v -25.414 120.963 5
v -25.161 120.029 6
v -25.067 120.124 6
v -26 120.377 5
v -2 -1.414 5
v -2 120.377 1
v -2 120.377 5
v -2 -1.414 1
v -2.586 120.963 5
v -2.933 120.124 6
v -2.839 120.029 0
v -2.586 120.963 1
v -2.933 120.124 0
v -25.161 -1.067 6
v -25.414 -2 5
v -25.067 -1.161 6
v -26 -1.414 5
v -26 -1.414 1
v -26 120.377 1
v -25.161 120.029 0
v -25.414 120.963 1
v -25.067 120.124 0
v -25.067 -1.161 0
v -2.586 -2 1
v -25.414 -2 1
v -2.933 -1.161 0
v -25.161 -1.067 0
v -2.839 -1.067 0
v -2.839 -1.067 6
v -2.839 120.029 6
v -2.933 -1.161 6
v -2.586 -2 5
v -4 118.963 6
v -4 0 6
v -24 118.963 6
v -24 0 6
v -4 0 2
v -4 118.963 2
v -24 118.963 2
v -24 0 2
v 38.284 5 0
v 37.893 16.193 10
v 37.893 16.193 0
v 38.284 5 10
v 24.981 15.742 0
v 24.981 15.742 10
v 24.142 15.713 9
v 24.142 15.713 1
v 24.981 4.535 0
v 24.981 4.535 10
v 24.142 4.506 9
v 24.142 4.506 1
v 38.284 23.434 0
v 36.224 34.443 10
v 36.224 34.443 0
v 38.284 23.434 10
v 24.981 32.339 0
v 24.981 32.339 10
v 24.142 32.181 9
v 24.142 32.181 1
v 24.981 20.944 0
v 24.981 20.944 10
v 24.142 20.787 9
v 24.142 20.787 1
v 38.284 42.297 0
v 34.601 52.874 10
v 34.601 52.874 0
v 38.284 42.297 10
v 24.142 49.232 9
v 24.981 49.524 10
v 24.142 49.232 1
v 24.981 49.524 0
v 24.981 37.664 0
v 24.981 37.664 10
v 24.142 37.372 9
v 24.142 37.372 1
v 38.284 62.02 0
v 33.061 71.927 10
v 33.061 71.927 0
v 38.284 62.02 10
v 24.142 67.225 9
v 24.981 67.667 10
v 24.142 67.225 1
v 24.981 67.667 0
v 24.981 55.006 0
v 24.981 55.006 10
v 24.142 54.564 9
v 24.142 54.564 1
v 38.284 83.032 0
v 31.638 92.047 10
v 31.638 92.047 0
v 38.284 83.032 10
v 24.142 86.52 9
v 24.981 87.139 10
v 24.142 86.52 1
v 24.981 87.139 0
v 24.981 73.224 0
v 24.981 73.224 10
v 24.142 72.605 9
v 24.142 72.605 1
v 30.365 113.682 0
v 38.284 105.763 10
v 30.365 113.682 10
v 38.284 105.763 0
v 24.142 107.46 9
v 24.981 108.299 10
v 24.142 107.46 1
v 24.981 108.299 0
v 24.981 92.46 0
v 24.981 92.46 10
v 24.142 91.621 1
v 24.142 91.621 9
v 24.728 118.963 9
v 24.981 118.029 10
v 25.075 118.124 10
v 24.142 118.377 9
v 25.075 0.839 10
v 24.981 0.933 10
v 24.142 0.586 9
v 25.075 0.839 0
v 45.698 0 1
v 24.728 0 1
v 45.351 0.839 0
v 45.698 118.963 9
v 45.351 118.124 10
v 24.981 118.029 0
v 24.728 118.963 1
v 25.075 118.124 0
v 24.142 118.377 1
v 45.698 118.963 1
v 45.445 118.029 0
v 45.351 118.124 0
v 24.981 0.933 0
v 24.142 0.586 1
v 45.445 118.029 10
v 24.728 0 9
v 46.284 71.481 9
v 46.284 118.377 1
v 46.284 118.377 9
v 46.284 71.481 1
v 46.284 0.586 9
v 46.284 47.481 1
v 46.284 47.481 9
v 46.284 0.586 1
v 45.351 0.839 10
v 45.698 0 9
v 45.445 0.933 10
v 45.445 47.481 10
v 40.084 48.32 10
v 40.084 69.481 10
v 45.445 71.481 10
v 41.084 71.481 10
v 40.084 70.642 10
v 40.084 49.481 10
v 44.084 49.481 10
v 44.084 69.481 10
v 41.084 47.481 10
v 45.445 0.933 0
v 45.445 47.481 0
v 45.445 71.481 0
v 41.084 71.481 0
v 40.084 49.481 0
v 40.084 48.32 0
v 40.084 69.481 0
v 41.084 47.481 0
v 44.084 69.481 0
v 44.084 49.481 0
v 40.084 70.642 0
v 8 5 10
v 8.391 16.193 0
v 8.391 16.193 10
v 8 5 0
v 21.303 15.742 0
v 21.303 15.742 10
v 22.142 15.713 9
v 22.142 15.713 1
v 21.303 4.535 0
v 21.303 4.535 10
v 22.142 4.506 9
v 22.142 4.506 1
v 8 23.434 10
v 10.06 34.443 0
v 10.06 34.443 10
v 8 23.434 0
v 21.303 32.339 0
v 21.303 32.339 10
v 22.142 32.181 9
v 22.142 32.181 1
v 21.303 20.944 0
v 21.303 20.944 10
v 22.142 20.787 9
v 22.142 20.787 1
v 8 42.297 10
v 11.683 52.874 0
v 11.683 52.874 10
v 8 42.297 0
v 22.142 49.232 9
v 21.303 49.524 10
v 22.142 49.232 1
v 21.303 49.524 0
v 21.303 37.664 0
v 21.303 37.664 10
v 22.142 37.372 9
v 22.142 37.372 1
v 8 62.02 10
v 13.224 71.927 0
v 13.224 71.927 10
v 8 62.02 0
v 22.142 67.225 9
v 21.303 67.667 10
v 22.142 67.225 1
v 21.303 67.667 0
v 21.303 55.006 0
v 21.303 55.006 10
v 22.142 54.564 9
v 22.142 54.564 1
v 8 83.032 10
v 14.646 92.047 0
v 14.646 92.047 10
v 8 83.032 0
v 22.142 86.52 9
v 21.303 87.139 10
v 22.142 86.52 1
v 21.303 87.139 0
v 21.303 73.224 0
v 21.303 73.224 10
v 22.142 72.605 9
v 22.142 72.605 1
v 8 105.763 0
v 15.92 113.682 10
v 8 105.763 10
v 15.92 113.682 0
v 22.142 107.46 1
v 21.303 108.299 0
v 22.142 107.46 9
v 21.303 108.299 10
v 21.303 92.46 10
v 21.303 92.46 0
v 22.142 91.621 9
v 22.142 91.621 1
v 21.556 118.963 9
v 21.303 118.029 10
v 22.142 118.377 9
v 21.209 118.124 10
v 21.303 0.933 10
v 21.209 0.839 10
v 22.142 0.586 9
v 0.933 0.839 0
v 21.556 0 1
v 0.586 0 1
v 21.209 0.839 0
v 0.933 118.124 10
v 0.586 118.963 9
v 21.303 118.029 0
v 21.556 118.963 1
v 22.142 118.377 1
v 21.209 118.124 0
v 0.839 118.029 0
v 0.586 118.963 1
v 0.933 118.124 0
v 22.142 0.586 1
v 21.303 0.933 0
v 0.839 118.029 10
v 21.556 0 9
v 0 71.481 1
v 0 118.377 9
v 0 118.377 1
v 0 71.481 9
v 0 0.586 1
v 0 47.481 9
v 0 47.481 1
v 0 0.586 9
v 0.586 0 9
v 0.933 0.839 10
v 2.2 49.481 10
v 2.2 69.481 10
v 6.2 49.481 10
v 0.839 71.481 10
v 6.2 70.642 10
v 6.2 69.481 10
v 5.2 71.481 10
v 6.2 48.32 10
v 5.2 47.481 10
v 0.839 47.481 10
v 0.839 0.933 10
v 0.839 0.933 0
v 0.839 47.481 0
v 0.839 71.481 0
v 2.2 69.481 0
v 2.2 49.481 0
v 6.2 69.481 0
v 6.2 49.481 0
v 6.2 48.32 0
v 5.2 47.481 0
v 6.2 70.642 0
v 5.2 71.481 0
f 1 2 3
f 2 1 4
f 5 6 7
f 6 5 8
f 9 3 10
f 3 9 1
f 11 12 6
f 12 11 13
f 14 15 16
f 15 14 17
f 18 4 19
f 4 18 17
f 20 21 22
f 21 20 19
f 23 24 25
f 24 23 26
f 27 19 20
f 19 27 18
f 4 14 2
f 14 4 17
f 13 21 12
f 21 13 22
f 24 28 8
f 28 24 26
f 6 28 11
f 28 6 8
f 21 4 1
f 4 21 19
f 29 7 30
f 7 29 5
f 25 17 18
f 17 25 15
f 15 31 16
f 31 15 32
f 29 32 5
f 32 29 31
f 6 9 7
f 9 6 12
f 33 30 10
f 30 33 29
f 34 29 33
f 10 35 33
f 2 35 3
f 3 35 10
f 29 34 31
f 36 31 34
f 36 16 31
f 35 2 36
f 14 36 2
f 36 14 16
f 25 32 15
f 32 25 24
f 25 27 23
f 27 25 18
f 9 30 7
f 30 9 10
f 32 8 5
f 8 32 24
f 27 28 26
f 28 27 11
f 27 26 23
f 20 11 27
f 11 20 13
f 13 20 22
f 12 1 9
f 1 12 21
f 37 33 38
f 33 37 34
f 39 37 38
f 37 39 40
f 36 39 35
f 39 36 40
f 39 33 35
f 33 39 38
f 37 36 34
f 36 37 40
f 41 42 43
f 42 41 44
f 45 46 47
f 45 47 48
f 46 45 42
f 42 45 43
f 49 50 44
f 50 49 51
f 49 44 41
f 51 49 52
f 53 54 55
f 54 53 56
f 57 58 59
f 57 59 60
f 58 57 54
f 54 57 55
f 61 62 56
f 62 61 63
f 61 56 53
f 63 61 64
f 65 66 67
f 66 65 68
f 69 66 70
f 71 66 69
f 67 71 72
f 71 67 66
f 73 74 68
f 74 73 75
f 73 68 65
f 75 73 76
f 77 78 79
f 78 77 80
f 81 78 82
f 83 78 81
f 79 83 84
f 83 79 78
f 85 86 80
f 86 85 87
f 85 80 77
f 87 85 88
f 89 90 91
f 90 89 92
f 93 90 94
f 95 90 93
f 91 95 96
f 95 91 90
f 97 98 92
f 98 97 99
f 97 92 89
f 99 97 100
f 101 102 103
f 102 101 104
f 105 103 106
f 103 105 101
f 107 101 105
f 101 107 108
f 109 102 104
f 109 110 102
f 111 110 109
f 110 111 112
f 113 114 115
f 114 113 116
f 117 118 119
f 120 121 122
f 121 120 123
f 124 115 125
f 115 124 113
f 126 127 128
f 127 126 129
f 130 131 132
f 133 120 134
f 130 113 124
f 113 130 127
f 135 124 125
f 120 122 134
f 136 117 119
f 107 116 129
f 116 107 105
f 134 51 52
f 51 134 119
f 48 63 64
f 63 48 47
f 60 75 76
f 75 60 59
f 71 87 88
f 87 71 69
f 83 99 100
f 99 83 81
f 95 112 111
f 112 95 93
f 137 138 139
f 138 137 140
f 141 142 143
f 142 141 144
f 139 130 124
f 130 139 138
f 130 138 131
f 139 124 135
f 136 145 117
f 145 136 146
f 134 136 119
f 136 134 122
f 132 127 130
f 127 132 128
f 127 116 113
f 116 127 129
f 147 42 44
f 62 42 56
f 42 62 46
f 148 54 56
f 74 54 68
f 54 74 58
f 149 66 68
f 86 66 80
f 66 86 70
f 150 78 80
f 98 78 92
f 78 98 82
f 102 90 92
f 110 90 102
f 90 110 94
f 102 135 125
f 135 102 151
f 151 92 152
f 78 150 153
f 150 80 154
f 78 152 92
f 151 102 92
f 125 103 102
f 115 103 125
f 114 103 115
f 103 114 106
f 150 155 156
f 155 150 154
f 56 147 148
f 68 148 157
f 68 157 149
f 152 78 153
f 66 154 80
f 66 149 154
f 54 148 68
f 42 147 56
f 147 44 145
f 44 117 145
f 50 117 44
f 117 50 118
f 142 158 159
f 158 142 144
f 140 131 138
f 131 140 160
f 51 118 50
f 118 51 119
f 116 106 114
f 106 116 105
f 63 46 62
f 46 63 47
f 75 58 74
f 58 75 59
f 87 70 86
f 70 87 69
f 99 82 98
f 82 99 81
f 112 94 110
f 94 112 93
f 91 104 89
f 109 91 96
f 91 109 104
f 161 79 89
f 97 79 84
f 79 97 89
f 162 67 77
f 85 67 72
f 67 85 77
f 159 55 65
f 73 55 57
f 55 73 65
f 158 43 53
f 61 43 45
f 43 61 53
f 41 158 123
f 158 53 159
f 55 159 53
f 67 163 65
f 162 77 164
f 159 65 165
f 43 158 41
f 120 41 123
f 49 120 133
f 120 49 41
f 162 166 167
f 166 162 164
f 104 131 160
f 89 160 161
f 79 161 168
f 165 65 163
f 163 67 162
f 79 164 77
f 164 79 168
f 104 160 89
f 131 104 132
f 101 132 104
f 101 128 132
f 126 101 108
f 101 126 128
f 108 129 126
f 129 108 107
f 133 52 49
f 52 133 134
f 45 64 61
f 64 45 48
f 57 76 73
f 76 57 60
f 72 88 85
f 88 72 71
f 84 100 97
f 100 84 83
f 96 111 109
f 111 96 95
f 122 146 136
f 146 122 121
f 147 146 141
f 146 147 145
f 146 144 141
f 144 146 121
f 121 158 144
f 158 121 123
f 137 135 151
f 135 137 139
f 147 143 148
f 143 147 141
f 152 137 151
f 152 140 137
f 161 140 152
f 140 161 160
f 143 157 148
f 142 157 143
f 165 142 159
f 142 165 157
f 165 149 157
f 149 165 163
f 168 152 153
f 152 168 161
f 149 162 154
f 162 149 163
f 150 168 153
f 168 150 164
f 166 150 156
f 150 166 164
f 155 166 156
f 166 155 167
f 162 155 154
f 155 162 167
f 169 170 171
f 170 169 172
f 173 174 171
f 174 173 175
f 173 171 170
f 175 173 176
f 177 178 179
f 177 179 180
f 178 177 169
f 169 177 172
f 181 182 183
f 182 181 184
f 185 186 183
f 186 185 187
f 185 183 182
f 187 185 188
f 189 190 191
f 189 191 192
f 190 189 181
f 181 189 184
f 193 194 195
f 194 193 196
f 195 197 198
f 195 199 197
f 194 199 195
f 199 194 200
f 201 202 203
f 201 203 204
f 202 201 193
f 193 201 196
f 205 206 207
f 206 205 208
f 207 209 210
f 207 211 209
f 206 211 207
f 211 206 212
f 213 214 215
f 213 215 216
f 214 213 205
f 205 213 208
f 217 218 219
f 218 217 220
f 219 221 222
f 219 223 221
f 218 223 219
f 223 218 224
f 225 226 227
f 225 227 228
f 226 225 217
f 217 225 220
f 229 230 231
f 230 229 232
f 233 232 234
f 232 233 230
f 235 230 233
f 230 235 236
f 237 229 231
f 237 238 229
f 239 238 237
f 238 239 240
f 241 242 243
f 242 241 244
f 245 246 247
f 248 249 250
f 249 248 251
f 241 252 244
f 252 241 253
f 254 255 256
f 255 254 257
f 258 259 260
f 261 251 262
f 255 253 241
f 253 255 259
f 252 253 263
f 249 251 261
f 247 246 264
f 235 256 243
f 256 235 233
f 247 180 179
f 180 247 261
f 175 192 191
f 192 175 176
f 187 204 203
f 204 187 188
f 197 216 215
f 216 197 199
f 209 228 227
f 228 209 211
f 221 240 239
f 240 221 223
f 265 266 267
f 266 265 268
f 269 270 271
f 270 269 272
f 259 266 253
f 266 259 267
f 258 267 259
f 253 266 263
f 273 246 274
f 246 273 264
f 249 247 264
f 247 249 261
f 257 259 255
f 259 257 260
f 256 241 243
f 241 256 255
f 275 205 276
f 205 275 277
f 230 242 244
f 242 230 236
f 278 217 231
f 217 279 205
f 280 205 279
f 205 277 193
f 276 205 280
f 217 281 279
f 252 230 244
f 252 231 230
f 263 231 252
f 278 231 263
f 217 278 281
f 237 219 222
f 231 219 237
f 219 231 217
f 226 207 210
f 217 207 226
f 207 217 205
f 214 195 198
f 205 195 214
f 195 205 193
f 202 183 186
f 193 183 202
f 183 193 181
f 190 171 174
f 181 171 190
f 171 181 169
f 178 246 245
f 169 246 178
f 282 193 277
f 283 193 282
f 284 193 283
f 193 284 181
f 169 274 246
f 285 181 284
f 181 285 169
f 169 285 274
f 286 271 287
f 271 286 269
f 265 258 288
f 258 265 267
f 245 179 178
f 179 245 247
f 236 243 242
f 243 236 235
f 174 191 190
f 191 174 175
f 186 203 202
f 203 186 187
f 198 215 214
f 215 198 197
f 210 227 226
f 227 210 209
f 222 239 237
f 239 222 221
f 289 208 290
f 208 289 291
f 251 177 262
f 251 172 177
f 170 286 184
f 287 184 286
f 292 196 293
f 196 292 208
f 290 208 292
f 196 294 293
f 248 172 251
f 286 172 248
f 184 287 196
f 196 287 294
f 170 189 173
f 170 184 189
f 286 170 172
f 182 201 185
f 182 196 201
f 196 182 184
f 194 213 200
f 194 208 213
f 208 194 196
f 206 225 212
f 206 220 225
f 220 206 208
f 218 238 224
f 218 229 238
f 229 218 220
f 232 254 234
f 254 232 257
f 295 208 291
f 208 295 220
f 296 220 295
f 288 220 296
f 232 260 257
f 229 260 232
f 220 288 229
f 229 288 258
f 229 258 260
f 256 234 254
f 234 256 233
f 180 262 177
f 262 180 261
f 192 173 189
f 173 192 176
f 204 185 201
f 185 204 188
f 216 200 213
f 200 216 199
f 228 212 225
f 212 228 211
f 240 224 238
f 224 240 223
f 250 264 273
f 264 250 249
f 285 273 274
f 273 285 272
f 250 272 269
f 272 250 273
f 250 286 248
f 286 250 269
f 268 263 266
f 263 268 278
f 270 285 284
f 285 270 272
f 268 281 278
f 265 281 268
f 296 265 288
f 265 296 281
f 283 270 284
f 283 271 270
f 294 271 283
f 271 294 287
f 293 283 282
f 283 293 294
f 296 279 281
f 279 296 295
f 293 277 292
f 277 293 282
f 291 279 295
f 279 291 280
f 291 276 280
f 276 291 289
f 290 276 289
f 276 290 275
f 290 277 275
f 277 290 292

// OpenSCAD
// [FL_INDEX: keywords="openscad, 3d_parametric, Customizable_Multi_Stand, csg_solid" | COT="Parametric OpenSCAD design from 3DCodeverse"]
// Title: Customizable Multi Stand

// Title: MultiStand
// Author: http://www.thingiverse.com/Jinja
// Date: 29/1/2013

/////////// START OF PARAMETERS /////////////////

// The thickness of your tablet. This will determine the size of the slots your tablet will fit into. mm =
tablet_thickness = 11.2;

// The height of your tablet. If you only want landscape, then use the short length. Otherwise use the long length. mm =
tablet_height = 190;

// How deep each slot will be, just under 10% of your tablet height is a good guide. mm =
slot_depth = 10.0;

// Increase the length of your stand to get more slots, % =
extra_length_percent=0; //[0:100]

// How many lids do you want for your stand. 
number_of_lids = 1; // [1:OneLid, 2:TwoLids]

// How wide in mm each rest will be. mm =
stand_width = 10; //[6:20]

// To discover the calibration value of your printer, first print out the lid. Then print out the calibration rest which will fit onto the lid. If the fit is too loose then increase the calibration and try again. If the fit is too tight then decrease the calibration value. I suggest printing out CalibrationRests for values 0, 2 & 4 simultaneously and go from there. When you've found your value then you can print out the full sized Rest. Zero means your printer is perfectly calibrated. Value = 
calibration = 0;//[-8:8]

// Select which STL plate you want to create. 
plate = "FullPlate"; //[ Lid, CalibrationRest, Rest, FullPlate ]

// Choose the pattern for the lid. For speed, use the circle to iterate on positioning before choosing the pattern you want. This is because the circle is faster to process. In fact, the list is ordered from fast to slow.
patternID = 0; // [0:NoPattern, 1:Circle, 4:Fish, 3:Apple, 5:Makerbot, 2:Android]

// Offset the pattern in the X axis. mm =
pattern_offset_x = 0; //[-20:20]

// Offset the pattern in the Y axis. mm =
pattern_offset_y = 0; //[-20:20]

// The size of the pattern. mm =
pattern_size = 35; //[8:60]

// Spacing percentage. 100=no overlap. Less than 100 means some overlap. More than 100 means more space between the patterns. % =
pattern_overlap_percent = 105; //[50:150]

// preview[view:south, tilt:top]

/////////// END OF PARAMETERS /////////////////
// not parameters, do not change
pattern_overlap = pattern_overlap_percent/100;
overhang = 40*1;  // the angle of overhang your printer can manage (no need to exceed 45)
rounded = 1*1;    // the mm width of the bevelled edge
rear_buf = 5*1;
front_buf = 2+tablet_thickness;

holder_height = 6*1;
holder_thick = 2*1;

extra_length=1+ (extra_length_percent/100);
base_min = holder_height+2;
height = base_min+slot_depth/sin(45);
slot_range = tablet_height*sin(45)*0.75*extra_length;
depth = rear_buf+slot_range + front_buf;
spacing = (1.1*tablet_thickness)/sin(45);
num_slots = floor(slot_range/spacing);
buffer = (calibration)*0.05;

calib_width = 2*(stand_width+holder_thick)+4;

if( plate == "Calibration" )
{
	test_stand();
	translate([-7,12,0])
	holder(3, 20, 0, 0);
}
else if( plate == "CalibrationRest" )
{
//		translate([0,-depth*0.5+5+holder_thick+2,0])
//		final_stand(number_of_lids);
	difference()
	{
	intersection()
	{
		translate([0,-depth*0.5+stand_width+holder_thick+2,0])
		final_stand(1);
		cube([holder_height+2,calib_width,5]);
	}

	for(i=[-8:1:8])
	{
		translate([holder_height+2,(0.5+(i/16))*calib_width,5*0.5])
		cube([calib_width/32,calib_width/32,calib_width/32],true);
	}
	for(i=[-8:8:8])
	{
		translate([holder_height+2,(0.5+(i/16))*calib_width,5*0.3])
		cube([calib_width/32,calib_width/32,calib_width/32],true);
	}
	translate([holder_height+2,(0.5+(calibration/16))*calib_width,5*0.7])
	cube([calib_width/32,calib_width/32,calib_width/32],true);
	}
}
else if( number_of_lids == 1 )
{
   if( plate == "FullPlate" )
	{
		translate([-(stand_width+holder_thick)-2,depth*0.5,0])
		holder(stand_width, depth, 0, patternID);
	
		translate([2*height+2,0,0])
		scale([-1,1,1])
		final_stand(number_of_lids);
	
		translate([0,0,0])
		final_stand(number_of_lids);
	}
	else if ( plate == "Lid" )
	{
		translate([-(stand_width+holder_thick)-2,depth*0.5,0])
		holder(stand_width, depth, 0, patternID);
	}
	else if ( plate == "Rest" )
	{
		final_stand(number_of_lids);
	}
}
else if ( number_of_lids == 2 )
{
   if( plate == "FullPlate" )
	{
		translate([3*-(stand_width+holder_thick)-4,depth*0.5,0])
		holder(stand_width, depth, 0, patternID);
	
		translate([-(stand_width+holder_thick)-2,depth*0.5,0])
		holder(stand_width, depth, 0, patternID);
	
		translate([2*height+2,0,0])
		scale([-1,1,1])
		final_stand(number_of_lids);
	
		translate([0,0,0])
		final_stand(number_of_lids);
	}
	else if ( plate == "Lid" )
	{
		translate([-(stand_width+holder_thick)-2,depth*0.5,0])
		holder(stand_width, depth, 0, patternID);
	}
	else if ( plate == "Rest" )
	{
		final_stand(number_of_lids);
	}

}


$fs=0.3;
//$fa=5; //smooth
$fa=10; //not so smooth
//$fa=20; //rough

module lid_cutter(pos, patternID )
{
	translate([0.2,depth*0.5,0])
	rotate([90,0,90])
	holder(stand_width, depth, buffer, patternID);

	translate([-1,depth*0.5,0])
	rotate([90,0,90])
	holder(stand_width, depth, buffer, patternID);
}

module test_stand()
{
	step = 13;
	difference()
	{
		minkowski()
		{
			translate([rounded, rounded, rounded])
			cube([11, 8*step+2, 1]);
			diamond(rounded);
		}
	for(i=[0:1:7])
	{
		translate([0,i*step+8,0])
		rotate( [90,0,90] )
   	holder( 3, 20, 0.0+(i*0.05) );
		translate([-1,i*step+8,0])
		rotate( [90,0,90] )
   	holder( 3, 20, 0.0+(i*0.05) );
		
		translate([7,i*step+4,1])
		{
			if(i==0)
			{
				write("1",h=8,t=4);
			}
			else if(i==1)
			{
				write("2",h=8,t=4);
			}
			else if(i==2)
			{
				write("3",h=8,t=4);
			}
			else if(i==3)
			{
				write("4",h=8,t=4);
			}
			else if(i==4)
			{
				write("5",h=8,t=4);
			}
			else if(i==5)
			{
				write("6",h=8,t=4);
			}
			else if(i==6)
			{
				write("7",h=8,t=4);
			}
			else if(i==7)
			{
				write("8",h=8,t=4);
			}
		}

	}
	}
}

module final_stand(number_of_lids)
{
	pos = -stand_width*2;
	if( number_of_lids == 1 )
	{
		difference()
		{
			stand2();
			lid_cutter(pos,0);
		}
	}
	else if (number_of_lids == 2 )
	{
		difference()
		{
			stand2();
			translate([0,depth*0.25,0])	
			lid_cutter(pos,0);
			translate([0,depth*-0.25,0])	
			lid_cutter(pos,0);
		}
	}
}

module right_stand(number_of_lids)
{
//	pos = -stand_width;
	pos = -stand_width*2;
	if( number_of_lids == 1 )
	{
		difference()
		{
			stand();
			lid_cutter(pos,0);
		}
	}
	else if (number_of_lids == 2 )
	{
		difference()
		{
			stand();
			translate([0,depth*0.25,0])	
			lid_cutter(pos,0);
			translate([0,depth*-0.25,0])	
			lid_cutter(pos,0);
		}
	}

}

module left_stand(number_of_lids)
{
//	pos = -depth-2*holder_thick;
	pos = -stand_width*2;
	if( number_of_lids == 1 )
	{
		difference()
		{
			stand();
			lid_cutter(pos,0);
		}
	}
	else if (number_of_lids == 2 )
	{
		difference()
		{
			stand();

			translate([0,depth*0.25,0])	
			lid_cutter(pos,0);
			translate([0,depth*-0.25,0])	
			lid_cutter(pos,0);
		}
	}
}

module holder(stand_width, depth, outerextra, patternID)
{
	difference()
	{
		minkowski()
		{
			translate([0, 0, (holder_height+outerextra)*0.5])
			cube([(stand_width+holder_thick+outerextra)*2-(2*rounded), depth+2*(outerextra+holder_thick)-(2*rounded), holder_height+outerextra-(2*rounded)],true);
			diamond(rounded);
		}
		translate([0, 0, holder_thick+holder_height*0.5 + outerextra])
		cube([(stand_width-outerextra)*2, depth-2*outerextra, holder_height+outerextra],true);

		if( patternID > 0 )
		{
			pattern(stand_width, depth, outerextra, patternID );
		}
	}
}

module pattern(stand_width, depth, extra, patternID)
{
	xoffset = pattern_offset_x;
	yoffset = pattern_offset_y;
	steps = pattern_size;
	radius = steps*0.45;
	overlap = pattern_overlap;
	intersection()
	{
		for(x=[xoffset-10:steps*overlap:(stand_width+holder_thick+extra)*2-(2*rounded)+(steps)+xoffset+10])
		{
			for(y=[yoffset-10:steps*overlap:depth+2*(extra+holder_thick)-(2*rounded)+(steps)+yoffset+10])
			{
				translate([-stand_width*2, -0.5*(depth+2*(extra+holder_thick)-(2*rounded)), 0])
				translate([x,y,-1])
				rotate([0,0,x*57+y*79])
				pattern_shape( radius, 10, patternID );
//				android( radius*2, 10 );
//				cylinder(10, radius, radius);
			}
		}
		translate([0, 0, (holder_height+extra)*0.5])
		cube([(stand_width+extra)*2, depth+2*extra, holder_height*3],true);
	}
}

module stand2()
{
	final_spacing = slot_range/(num_slots);
	between = (final_spacing - tablet_thickness);
	adj_spacing = final_spacing - (between/num_slots);
	difference()
	{
		minkowski()
		{
			translate([rounded-buffer, rounded-buffer, rounded])
			cube([height-(2*rounded), depth-(2*rounded)-(2*buffer)-(2*buffer), stand_width-(2*rounded)-(2*buffer)]);
			diamond(rounded);
		}
		if( num_slots > 7 )
		{

			for(i=[0:1:(num_slots)])
			{
				
				translate([base_min,(i*adj_spacing)+rear_buf+(((i/num_slots)*(i/num_slots)*(i/num_slots)*(i/num_slots)*(i/num_slots)*(i/num_slots))*between),-0.1])
				rotate([0,0,-(0+i*(45/(num_slots)))])
				cube([height*2, tablet_thickness, stand_width-2*buffer+0.2]);
			}
		}
		else if( num_slots > 5 )
		{
			for(i=[0:1:(num_slots)])
			{
				
				translate([base_min,(i*adj_spacing)+rear_buf+(((i/num_slots)*(i/num_slots)*(i/num_slots)*(i/num_slots)*(i/num_slots))*between),-0.1])
				rotate([0,0,-(0+i*(45/(num_slots)))])
				cube([height*2, tablet_thickness, stand_width-2*buffer+0.2]);
			}
		}
		else
		{
			for(i=[0:1:(num_slots)])
			{
				
				translate([base_min,(i*adj_spacing)+rear_buf+(((i/num_slots)*(i/num_slots)*(i/num_slots))*between),-0.1])
				rotate([0,0,-(2+i*(43/(num_slots)))])
				cube([height*2, tablet_thickness, stand_width-2*buffer+0.2]);
			}
		}
	}
}

module cutter(dist, overhang)
{
	size = dist*2;

	translate([dist,-dist,-dist])
	cube([size,size,size]);

	translate([-dist-size,-dist,-dist])
	cube([size,size,size]);

	translate([dist,-dist,0])
	rotate([0,-overhang,0])
	cube([size,size,size]);

	translate([-dist,-dist,0])
	rotate([0,-90+overhang,0])
	cube([size,size,size]);

	translate([dist,-dist,0])
	rotate([0,90+overhang,0])
	cube([size,size,size]);

	translate([-dist,-dist,0])
	rotate([0,180-overhang,0])
	cube([size,size,size]);

}

module diamond( rounded )
{
	dist = rounded;
	difference()
	{
		cube([2*rounded,2*rounded,2*rounded], true);
		for(i=[0:45:179])
		{
			rotate([0,0,i])
			cutter(dist, overhang);
		}
	}
}

//translate([0,0,30])
//android( 20, 4 );

module android( oheight, depth )
{
	scale = 1.1;
	height = oheight*scale;
	width = height*0.4;
	gap = height*0.03;
	radius = height*0.045;

//	cube( [ oheight,2,oheight] );

	translate( [-oheight*0.5,oheight*0.5,0])
	rotate([90,0,0])
	translate( [-(height-oheight)*0.5,-depth-1,-height*0.14])
	{
	translate( [(height-width)*0.5+radius,depth,(height-width)*0.5+radius])

/*	minkowski()
	{
		translate([0,0,0])
		cube( [ width-(2*radius),depth-1,width-(2*radius)] );
		rotate([-90,0,0])
		cylinder( 1, radius, radius );
	}*/

	hull()
	{
		translate([0,0,0])
		rotate([-90,0,0])
		cylinder( depth, radius, radius );

		translate([width-(2*radius),0,0])
		rotate([-90,0,0])
		cylinder( depth, radius, radius );

/*		translate([width-(2*radius),0,width-(2*radius)])
		rotate([-90,0,0])
		cylinder( depth, radius, radius );

		translate([0,0,width-(2*radius)])
		rotate([-90,0,0])
		cylinder( depth, radius, radius );*/

		translate( [-((height-width)*0.5+radius),-depth,-((height-width)*0.5+radius)])
		translate( [(height-width)*0.5,depth,(height)*0.5])
		cube( [ width,depth,width*0.5] );

	}


	translate( [height*0.5,depth,(height+width)*0.5+gap])

	rotate([-90,0,0])
	difference()
	{
		cylinder( depth, width*0.5, width*0.5 );
		translate([-width*0.5,0,0])
		cube( [width,width,depth]);
		if(radius*0.25>0.7)
		{
			translate([-radius*2,-radius*2,0])
			cylinder( depth, radius*0.5, radius*0.5 );
			translate([radius*2,-radius*2,0])
			cylinder( depth, radius*0.5, radius*0.5 );

			// the next two cubes are the things that keep the eyes in place
			translate([-radius*2,-radius*2,0])
			rotate([0,0,-135])
			translate([0,radius*-0.125,0])
			cube([radius*2,radius*0.25,depth]);
		
			translate([radius*2,-radius*2,0])
			rotate([0,0,-45])
			translate([0,radius*-0.125,0])
			cube([radius*2,radius*0.25,depth]);
		}
	}
			

	translate( [((height-width)*0.5)-radius-gap,depth,((height+width)*0.5)-radius])
	arm(radius,depth);
	translate( [((height+width)*0.5)+radius+gap,depth,((height+width)*0.5)-radius])
	arm(radius,depth);

	translate( [(height*0.5)+(1.8*radius),depth,(height*0.4)])
	arm(radius,depth);
	translate( [(height*0.5)-(1.8*radius),depth,(height*0.4)])
	arm(radius,depth);

	translate([height*0.5+width*0.35,depth,height*0.95])
	rotate([0,40,0])
	arm(radius*0.3,depth);

	translate([height*0.5-width*0.35,depth,height*0.95])
	rotate([0,-40,0])
	arm(radius*0.3,depth);
	}
}

module arm(radius,depth)
{
	hull()
	{
		rotate([-90,0,0])
		cylinder(depth,radius,radius);
		translate([0,0,-4.7*radius])
		rotate([-90,0,0])
		cylinder(depth,radius,radius);
	}
}


/*translate([0,0,20])
pattern_shape(10, 5, 1);

translate([0,0,30])
pattern_shape(10, 5, 2);

translate([0,0,40])
pattern_shape(10, 5, 3);

translate([0,0,50])
pattern_shape(10, 5, 4);

translate([0,0,60])
pattern_shape(10, 5, 5);
*/

module pattern_shape( radius, height, patternID )
{
	if( patternID == 1 )
	{
		cylinder(height, radius, radius);
	}
	else if (patternID == 2)
	{
		android(radius*2, height);
	}
	else if (patternID == 3)
	{
		apple( radius, height );
	}
	else if (patternID == 4)
	{
		fish( radius, height );
	}
	else if (patternID == 5)
	{
		makerbot_logo( radius, height );
	}
}

module apple(radius, depth)
{
	fish_scale = 0.22 * (radius/5);
	fish_height = depth/fish_scale;

	difference()
	{
		translate( [-radius*0.9,0,depth*0.5] )
		scale(fish_scale)
		translate( [20,0,0] )
		linear_extrude(height = fish_height, center = true)
		polygon([[0,-15],[-4,-16],[-7,-16],[-10,-14],[-12,-11],[-15,-5],[-17,3],[-17,7],[-16,11],[-15,13],[-13,15],[-9,16],[-5,16],[-3,15],[0,14],[3,15],[5,16],[9,16],[13,15],[15,13],[16,11],[17,7],[17,3],[15,-5],[12,-11],[10,-14],[7,-16],[4,-16]]);

		translate( [radius*0.8,radius*0.2,0] )
		cylinder(depth, radius*0.4, radius*0.4);
	}

	translate( [-radius*0.9,0,depth*0.5] )
	scale(fish_scale)
	translate( [20,0,0] )
	linear_extrude(height = fish_height, center = true)
	polygon([[0,20],[0,17],[3,17],[6,18],[7,19],[8,20],[9,23],[9,26],[9,26],[6,26],[3,25],[2,24],[1,23]]);


}

module fish(radius, depth)
{
	fish_scale = 0.22 * (radius/5);
	fish_height = depth/fish_scale;
	translate( [-radius*0.9,0,depth*0.5] )
	scale(fish_scale)
	translate( [43,-12,0] )
	linear_extrude(height = fish_height, center = true)
	polygon([[-45,12],[-41,16],[-38,18],[-34,20],[-30,21],[-25,21],[-21,20],[-19,19],[-16,17],[-14,14],[-13,15],[-12,18],[-9,21],[-4,22],[-6,19],[-8,17],[-9,13],[-9,11],[-8,7],[-6,5],[-4,2],[-9,3],[-12,6],[-13,9],[-14,10],[-16,7],[-19,5],[-21,4],[-25,3],[-30,3],[-34,4],[-38,6],[-41,8]]);
}

module makerbot_logo(radius, height)
{
	width=radius*0.13;
	cut=width*1.3;
	angle=asin(cut/radius);
	aangle=0;
	x1=(radius-width*0.5)*sin(angle+aangle);
	y1=(radius-width*0.5)*cos(angle+aangle);
	x2=(radius-width*0.5)*sin(-angle+aangle);
	y2=(radius-width*0.5)*cos(-angle+aangle);
	mwidth=width*1.8;
	mgap=width*1.3;
	mheight = radius*1.3;

	difference()
	{
		cylinder(height, radius, radius);
		cylinder(height, radius-width, radius-width);
		translate([0,0,height*0.5])
		rotate([0,0,-aangle])
		{
			cube([2*radius,cut+width,height],true);
			cube([cut+width,2*radius,height],true);
		}
	}

	translate([x1,y1,0])
	cylinder(height, width*0.5, width*0.5);
	translate([y1,-x1,0])
	cylinder(height, width*0.5, width*0.5);
	translate([-y1,x1,0])
	cylinder(height, width*0.5, width*0.5);
	translate([-x1,-y1,0])
	cylinder(height, width*0.5, width*0.5);
	translate([x2,y2,0])
	cylinder(height, width*0.5, width*0.5);
	translate([y2,-x2,0])
	cylinder(height, width*0.5, width*0.5);
	translate([-y2,x2,0])
	cylinder(height, width*0.5, width*0.5);
	translate([-x2,-y2,0])
	cylinder(height, width*0.5, width*0.5);


	translate([0,mwidth*-0.25,height*0.5])	
	cube([mwidth,mheight-1.5*mwidth,height],true);
	translate([mwidth+mgap,mwidth*-0.25,height*0.5])
	cube([mwidth,mheight-1.5*mwidth,height],true);
	translate([-mwidth-mgap,mwidth*-0.25,height*0.5])
	cube([mwidth,mheight-1.5*mwidth,height],true);
	translate([0,(mheight-mwidth)*0.5,height*0.5])	
	cube([mwidth+2*mgap,mwidth,height],true);

	translate([-mgap-mwidth*0.5,mheight*0.5-mwidth,0])
	difference()
	{
		cylinder(height,mwidth,mwidth);
		translate([0,-mwidth,0])
		cube([mwidth,mwidth,height]);
	}

	translate([mgap+mwidth*0.5,mheight*0.5-mwidth,0])
	difference()
	{
		cylinder(height,mwidth,mwidth);
		translate([-mwidth,-mwidth,0])
		cube([mwidth,mwidth,height]);
	}

	translate([-mwidth-mgap,-(mheight-mwidth)*0.5,0])
	cylinder(height,mwidth*0.5,mwidth*0.5);

	translate([0,-(mheight-mwidth)*0.5,0])
	cylinder(height,mwidth*0.5,mwidth*0.5);

	translate([mwidth+mgap,-(mheight-mwidth)*0.5,0])
	cylinder(height,mwidth*0.5,mwidth*0.5);

}
